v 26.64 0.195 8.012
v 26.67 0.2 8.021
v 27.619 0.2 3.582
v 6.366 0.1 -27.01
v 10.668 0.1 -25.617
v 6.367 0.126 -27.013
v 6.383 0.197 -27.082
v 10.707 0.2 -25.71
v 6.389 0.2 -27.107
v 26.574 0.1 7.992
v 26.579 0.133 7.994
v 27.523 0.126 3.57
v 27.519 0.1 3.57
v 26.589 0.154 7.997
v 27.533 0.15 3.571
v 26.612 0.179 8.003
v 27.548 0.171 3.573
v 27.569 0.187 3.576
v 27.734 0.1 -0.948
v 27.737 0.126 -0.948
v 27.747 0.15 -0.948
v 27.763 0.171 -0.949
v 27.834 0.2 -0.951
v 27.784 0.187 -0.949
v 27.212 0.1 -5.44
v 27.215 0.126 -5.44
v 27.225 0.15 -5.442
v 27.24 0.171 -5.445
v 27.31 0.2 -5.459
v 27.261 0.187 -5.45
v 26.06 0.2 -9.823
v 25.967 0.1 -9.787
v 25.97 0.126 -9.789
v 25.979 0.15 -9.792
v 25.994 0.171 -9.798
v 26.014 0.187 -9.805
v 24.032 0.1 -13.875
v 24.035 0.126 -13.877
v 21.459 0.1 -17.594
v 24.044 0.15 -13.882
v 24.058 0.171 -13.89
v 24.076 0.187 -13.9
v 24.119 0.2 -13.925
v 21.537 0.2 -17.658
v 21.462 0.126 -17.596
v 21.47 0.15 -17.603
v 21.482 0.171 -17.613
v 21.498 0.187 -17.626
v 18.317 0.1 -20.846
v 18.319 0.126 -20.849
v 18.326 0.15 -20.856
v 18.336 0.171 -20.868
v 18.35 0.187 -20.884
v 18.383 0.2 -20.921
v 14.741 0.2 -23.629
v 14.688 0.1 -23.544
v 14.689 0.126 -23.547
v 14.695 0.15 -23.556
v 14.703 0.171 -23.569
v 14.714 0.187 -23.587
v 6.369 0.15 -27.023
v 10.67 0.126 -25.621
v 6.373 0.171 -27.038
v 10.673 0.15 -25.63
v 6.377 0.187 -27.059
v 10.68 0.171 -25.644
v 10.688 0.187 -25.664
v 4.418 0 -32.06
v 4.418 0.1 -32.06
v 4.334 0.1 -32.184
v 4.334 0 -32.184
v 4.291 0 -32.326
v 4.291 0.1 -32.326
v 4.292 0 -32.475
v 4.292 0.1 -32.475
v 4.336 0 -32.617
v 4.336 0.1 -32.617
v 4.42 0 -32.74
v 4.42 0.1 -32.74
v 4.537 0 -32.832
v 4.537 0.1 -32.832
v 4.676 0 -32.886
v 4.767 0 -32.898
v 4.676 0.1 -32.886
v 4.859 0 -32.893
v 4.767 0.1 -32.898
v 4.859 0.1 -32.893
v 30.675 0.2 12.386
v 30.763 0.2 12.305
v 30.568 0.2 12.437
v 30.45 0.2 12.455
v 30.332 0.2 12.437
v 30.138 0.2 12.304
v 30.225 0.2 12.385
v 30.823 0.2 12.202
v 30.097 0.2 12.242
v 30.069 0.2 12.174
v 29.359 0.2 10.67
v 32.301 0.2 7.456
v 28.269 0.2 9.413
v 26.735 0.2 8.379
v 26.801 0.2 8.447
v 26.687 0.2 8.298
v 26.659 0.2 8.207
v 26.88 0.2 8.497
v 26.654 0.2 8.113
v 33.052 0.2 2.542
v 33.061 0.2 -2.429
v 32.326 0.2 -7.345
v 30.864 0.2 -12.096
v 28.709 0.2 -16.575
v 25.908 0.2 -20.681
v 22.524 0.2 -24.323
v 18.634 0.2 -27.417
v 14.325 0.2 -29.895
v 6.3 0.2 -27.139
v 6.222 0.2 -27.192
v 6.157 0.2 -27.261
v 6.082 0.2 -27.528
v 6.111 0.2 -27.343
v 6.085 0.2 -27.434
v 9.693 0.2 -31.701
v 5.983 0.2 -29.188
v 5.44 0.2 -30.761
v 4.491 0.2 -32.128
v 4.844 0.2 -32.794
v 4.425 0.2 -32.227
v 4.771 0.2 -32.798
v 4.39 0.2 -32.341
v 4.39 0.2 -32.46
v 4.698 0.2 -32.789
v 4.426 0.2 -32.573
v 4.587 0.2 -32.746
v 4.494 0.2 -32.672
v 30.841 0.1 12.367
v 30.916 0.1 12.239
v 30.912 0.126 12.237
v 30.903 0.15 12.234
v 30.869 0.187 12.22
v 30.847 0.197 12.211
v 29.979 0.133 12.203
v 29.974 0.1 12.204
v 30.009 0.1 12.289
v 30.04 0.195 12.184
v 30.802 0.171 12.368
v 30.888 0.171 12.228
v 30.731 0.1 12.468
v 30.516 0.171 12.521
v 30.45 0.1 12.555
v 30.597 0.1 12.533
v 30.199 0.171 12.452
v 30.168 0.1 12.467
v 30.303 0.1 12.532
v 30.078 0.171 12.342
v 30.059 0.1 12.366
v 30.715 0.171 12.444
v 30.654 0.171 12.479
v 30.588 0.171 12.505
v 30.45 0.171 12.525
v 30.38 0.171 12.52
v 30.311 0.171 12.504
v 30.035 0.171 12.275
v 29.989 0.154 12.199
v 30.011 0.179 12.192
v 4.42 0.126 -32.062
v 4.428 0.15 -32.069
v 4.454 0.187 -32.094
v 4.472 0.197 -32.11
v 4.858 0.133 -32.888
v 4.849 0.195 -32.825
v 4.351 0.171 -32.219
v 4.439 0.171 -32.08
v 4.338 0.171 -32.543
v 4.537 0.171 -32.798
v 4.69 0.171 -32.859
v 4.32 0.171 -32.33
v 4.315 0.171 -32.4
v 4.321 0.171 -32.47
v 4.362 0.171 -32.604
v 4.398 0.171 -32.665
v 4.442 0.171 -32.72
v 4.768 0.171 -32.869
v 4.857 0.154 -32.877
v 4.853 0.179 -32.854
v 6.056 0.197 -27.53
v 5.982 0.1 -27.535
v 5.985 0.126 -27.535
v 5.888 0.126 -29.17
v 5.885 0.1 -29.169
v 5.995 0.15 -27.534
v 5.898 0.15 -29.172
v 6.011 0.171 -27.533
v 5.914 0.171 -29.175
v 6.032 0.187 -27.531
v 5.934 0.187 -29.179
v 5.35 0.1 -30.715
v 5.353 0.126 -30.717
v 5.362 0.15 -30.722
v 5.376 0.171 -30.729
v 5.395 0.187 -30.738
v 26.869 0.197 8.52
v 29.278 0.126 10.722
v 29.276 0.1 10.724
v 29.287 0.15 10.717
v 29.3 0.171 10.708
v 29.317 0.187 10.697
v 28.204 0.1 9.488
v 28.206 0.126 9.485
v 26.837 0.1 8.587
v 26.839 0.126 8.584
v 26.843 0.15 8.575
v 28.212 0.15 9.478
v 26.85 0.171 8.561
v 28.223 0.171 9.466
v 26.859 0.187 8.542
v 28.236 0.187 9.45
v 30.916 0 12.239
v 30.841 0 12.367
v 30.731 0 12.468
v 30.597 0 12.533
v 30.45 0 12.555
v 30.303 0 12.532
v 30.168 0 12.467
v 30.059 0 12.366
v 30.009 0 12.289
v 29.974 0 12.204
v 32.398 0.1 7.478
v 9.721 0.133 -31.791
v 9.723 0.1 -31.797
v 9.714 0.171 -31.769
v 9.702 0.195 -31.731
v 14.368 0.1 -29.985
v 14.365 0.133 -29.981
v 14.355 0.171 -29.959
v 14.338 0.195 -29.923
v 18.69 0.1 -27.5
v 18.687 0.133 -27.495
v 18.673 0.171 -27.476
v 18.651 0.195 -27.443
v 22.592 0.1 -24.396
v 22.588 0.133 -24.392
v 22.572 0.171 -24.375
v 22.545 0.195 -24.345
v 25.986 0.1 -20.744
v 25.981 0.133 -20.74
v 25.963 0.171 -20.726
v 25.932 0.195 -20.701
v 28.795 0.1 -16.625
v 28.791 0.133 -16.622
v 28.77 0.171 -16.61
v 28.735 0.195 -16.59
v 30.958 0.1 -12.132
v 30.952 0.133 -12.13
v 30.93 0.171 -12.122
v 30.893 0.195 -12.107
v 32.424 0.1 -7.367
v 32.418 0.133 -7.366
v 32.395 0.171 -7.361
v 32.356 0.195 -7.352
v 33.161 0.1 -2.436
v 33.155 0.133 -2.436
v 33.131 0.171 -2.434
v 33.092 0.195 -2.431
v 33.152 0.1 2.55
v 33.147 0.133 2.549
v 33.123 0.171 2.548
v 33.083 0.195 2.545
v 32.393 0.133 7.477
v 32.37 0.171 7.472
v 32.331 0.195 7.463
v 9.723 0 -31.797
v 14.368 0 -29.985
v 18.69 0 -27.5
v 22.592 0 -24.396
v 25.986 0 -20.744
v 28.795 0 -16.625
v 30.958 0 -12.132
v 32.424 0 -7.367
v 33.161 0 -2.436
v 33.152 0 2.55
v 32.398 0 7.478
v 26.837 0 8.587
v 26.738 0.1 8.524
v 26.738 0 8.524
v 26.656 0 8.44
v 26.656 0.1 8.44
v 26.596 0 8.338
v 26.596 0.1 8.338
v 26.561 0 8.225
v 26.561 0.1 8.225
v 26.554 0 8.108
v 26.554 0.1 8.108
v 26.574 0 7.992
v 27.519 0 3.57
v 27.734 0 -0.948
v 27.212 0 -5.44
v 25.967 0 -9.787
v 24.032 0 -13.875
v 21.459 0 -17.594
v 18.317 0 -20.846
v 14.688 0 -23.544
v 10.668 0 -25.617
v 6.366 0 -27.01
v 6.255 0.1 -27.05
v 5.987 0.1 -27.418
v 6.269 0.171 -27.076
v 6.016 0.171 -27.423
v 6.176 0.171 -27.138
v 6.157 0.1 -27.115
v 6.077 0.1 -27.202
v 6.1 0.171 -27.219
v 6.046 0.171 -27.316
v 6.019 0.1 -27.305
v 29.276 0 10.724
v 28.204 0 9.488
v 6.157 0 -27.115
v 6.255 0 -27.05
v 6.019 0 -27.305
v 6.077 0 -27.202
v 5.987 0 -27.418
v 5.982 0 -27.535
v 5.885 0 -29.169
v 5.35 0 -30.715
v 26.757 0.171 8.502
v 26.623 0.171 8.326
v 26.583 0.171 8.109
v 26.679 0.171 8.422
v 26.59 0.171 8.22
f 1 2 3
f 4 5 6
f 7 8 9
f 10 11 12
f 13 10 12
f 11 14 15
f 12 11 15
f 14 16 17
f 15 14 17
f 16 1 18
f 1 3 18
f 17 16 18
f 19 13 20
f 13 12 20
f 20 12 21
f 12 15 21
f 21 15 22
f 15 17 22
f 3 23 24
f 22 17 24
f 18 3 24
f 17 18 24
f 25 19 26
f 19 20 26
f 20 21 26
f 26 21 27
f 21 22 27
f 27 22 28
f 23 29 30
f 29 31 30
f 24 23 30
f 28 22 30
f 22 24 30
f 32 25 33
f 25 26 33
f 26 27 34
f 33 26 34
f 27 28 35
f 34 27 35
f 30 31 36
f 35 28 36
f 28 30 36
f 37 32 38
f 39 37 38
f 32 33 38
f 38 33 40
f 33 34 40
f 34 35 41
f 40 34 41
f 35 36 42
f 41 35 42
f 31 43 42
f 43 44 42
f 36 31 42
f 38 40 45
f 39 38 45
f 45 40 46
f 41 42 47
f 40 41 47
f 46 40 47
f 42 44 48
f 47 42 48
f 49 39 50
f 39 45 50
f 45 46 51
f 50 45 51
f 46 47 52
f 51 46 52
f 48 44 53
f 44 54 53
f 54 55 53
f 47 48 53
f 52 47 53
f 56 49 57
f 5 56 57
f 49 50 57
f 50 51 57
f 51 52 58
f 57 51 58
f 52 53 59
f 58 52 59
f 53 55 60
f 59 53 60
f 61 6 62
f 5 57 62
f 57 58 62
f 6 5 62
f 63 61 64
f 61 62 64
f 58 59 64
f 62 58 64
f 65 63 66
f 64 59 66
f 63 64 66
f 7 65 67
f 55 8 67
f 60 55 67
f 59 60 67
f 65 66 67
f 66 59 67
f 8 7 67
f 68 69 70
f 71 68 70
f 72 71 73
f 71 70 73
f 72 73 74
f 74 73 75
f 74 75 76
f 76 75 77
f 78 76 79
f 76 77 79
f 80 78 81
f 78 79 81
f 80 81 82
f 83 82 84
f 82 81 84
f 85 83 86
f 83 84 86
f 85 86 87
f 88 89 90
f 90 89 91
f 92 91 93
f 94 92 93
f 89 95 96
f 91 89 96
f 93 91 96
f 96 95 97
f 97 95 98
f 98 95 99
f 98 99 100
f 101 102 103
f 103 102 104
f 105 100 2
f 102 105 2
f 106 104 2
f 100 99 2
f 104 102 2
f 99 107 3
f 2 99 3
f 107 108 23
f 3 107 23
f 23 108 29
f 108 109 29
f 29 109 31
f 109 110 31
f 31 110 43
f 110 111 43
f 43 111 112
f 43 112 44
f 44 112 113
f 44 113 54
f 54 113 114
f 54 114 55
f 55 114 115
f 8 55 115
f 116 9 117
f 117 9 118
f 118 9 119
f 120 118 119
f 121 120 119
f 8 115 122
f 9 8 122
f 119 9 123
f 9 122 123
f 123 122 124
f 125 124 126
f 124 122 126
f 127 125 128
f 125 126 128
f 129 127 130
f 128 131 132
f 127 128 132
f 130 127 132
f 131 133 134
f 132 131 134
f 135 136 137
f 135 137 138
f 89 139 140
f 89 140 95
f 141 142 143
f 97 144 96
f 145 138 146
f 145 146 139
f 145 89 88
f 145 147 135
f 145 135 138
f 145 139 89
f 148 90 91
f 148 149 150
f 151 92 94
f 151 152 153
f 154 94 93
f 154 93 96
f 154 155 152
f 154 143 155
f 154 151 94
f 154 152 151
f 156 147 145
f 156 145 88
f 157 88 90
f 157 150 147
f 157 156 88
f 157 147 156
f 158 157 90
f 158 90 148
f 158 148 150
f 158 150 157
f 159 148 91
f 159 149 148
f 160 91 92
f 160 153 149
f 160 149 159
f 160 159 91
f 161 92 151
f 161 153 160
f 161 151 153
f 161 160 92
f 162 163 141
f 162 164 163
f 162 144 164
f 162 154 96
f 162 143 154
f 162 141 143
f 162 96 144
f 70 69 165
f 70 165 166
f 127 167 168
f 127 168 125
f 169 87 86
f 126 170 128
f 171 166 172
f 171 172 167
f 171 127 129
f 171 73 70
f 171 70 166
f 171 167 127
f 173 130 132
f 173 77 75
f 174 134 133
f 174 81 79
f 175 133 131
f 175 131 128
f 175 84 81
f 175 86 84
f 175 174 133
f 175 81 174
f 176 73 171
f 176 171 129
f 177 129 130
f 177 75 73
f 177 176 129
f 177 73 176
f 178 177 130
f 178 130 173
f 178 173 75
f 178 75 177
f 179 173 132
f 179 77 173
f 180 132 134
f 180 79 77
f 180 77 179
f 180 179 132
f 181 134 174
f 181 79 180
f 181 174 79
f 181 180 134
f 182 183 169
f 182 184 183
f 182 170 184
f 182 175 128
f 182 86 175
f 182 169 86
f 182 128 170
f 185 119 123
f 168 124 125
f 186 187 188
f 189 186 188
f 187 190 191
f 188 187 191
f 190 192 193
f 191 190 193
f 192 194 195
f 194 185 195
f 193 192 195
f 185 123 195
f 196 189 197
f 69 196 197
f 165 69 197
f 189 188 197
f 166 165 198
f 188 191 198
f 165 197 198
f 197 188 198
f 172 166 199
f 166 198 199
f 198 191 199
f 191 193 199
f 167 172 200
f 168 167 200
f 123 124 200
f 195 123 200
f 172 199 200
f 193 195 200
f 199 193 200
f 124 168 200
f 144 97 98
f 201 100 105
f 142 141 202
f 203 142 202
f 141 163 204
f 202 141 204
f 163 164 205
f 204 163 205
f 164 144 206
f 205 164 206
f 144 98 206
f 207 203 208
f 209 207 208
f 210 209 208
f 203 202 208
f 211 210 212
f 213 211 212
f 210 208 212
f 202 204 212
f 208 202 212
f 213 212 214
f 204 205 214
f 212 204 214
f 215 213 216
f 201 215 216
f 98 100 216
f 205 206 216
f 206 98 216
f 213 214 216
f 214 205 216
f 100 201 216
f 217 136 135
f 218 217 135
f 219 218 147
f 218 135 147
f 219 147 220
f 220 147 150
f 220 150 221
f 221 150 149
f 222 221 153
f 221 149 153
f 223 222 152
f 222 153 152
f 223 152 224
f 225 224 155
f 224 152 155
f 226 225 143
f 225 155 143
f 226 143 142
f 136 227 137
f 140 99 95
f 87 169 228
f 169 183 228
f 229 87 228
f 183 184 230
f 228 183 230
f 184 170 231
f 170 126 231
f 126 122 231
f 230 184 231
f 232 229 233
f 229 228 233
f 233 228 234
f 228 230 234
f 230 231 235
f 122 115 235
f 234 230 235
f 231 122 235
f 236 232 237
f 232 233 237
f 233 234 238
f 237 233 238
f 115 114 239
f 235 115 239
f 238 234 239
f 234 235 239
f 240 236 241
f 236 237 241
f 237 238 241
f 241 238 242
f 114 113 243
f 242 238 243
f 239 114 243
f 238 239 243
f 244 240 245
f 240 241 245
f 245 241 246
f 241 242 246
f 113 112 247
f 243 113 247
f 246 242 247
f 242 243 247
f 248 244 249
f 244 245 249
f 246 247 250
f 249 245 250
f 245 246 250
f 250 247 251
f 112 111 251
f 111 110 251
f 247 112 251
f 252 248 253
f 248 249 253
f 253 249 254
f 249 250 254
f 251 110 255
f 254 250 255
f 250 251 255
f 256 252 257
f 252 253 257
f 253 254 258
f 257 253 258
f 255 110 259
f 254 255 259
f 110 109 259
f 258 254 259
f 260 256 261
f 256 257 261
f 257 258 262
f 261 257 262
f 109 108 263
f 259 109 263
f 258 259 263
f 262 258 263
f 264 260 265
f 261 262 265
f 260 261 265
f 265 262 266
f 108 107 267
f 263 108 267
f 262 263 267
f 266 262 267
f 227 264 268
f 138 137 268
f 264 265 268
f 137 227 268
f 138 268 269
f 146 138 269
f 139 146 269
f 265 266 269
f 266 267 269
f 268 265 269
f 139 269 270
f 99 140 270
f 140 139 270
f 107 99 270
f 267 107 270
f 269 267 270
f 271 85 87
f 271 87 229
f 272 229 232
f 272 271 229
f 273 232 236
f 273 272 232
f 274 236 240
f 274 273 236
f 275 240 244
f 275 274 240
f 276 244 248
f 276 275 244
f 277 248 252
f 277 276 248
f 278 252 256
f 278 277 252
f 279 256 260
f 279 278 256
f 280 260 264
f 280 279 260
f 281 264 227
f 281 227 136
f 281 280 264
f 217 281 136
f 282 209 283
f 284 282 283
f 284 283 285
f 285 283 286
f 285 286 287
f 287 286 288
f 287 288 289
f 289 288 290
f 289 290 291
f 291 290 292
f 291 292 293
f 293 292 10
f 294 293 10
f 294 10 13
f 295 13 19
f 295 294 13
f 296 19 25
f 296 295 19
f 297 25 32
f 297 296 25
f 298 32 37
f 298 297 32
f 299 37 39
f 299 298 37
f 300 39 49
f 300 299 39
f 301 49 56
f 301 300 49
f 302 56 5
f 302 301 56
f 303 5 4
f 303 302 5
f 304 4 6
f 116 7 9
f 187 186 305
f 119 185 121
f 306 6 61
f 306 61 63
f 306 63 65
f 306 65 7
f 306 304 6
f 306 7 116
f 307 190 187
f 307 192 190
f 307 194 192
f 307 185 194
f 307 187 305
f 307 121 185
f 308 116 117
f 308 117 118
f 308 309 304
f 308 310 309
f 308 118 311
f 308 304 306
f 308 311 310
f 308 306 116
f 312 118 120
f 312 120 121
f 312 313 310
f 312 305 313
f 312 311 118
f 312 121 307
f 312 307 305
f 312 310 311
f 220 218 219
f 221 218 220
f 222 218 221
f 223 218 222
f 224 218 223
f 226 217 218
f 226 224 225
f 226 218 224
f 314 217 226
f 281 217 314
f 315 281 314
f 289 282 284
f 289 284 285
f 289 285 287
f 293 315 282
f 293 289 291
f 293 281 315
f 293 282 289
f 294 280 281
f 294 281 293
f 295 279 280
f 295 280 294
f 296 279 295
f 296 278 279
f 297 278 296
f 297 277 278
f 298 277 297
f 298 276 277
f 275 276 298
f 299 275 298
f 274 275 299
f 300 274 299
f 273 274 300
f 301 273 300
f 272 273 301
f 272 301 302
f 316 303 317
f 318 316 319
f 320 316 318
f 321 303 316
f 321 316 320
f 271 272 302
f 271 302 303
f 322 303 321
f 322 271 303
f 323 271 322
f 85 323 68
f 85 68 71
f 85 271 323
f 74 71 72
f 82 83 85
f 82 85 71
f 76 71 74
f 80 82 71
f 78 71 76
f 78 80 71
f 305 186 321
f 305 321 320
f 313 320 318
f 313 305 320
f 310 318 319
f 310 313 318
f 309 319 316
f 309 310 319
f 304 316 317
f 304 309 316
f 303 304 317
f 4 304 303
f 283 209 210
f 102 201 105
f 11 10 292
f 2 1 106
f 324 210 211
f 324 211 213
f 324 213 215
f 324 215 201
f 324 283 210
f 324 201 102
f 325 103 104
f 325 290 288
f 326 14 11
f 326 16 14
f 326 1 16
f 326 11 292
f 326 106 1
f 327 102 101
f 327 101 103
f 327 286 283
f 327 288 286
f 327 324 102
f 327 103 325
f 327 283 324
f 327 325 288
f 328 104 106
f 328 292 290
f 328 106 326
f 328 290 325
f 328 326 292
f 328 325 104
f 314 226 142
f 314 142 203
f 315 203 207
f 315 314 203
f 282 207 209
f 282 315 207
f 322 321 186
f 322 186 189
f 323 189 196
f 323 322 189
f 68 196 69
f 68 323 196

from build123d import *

# Parameters (mm, degrees)
BOSS_EXTRUDE1_DEPTH = 0.2
FILLET1_R           = 0.5
FILLET2_R           = 0.1


with BuildPart() as part:
    # Sketch1 → Boss-Extrude1 (new body)
    with BuildSketch(Plane(origin=(0, 0, 0), x_dir=(1, 0, 0), z_dir=(0, 1, 0))):
        with BuildLine():
            ThreePointArc((5.933363116, 27.108258929), (5.445514195, 30.519201292), (3.161776385, 33.099330357))
            ThreePointArc((3.161776385, 33.099330357), (28.795344676, 16.625), (30.24574913, -13.811486508))
            ThreePointArc((30.24574913, -13.811486508), (29.15316072, -10.543647016), (26.443122442, -8.415686276))
            ThreePointArc((26.443122442, -8.415686276), (24.032204955, 13.875), (5.933363116, 27.108258929))
        make_face()
    extrude(amount=BOSS_EXTRUDE1_DEPTH)

    # Fillet1
    fillet1_edges = [part.edges().sort_by_distance(p)[0] for p in [
        (5.933363116, 0.1, -27.108258929),
        (3.161776385, 0.1, -33.099330357),
        (30.24574913, 0.1, 13.811486508),
        (26.443122442, 0.1, 8.415686276),
    ]]
    fillet(fillet1_edges, radius=FILLET1_R)

    # Fillet2
    fillet2_edges = [part.edges().sort_by_distance(p)[0] for p in [
        (5.67065858, 0.2, -29.960518111),
        (28.795344676, 0.2, -16.625),
        (24.032204955, 0.2, -13.875),
        (28.781899085, 0.2, 10.069324669),
        (30.432518733, 0.2, 12.554273543),
        (26.595741318, 0.2, 8.338247788),
        (6.076736251, 0.2, -27.201711507),
        (4.343939552, 0.2, -32.632471095),
    ]]
    fillet(fillet2_edges, radius=FILLET2_R)


solid = part.part
